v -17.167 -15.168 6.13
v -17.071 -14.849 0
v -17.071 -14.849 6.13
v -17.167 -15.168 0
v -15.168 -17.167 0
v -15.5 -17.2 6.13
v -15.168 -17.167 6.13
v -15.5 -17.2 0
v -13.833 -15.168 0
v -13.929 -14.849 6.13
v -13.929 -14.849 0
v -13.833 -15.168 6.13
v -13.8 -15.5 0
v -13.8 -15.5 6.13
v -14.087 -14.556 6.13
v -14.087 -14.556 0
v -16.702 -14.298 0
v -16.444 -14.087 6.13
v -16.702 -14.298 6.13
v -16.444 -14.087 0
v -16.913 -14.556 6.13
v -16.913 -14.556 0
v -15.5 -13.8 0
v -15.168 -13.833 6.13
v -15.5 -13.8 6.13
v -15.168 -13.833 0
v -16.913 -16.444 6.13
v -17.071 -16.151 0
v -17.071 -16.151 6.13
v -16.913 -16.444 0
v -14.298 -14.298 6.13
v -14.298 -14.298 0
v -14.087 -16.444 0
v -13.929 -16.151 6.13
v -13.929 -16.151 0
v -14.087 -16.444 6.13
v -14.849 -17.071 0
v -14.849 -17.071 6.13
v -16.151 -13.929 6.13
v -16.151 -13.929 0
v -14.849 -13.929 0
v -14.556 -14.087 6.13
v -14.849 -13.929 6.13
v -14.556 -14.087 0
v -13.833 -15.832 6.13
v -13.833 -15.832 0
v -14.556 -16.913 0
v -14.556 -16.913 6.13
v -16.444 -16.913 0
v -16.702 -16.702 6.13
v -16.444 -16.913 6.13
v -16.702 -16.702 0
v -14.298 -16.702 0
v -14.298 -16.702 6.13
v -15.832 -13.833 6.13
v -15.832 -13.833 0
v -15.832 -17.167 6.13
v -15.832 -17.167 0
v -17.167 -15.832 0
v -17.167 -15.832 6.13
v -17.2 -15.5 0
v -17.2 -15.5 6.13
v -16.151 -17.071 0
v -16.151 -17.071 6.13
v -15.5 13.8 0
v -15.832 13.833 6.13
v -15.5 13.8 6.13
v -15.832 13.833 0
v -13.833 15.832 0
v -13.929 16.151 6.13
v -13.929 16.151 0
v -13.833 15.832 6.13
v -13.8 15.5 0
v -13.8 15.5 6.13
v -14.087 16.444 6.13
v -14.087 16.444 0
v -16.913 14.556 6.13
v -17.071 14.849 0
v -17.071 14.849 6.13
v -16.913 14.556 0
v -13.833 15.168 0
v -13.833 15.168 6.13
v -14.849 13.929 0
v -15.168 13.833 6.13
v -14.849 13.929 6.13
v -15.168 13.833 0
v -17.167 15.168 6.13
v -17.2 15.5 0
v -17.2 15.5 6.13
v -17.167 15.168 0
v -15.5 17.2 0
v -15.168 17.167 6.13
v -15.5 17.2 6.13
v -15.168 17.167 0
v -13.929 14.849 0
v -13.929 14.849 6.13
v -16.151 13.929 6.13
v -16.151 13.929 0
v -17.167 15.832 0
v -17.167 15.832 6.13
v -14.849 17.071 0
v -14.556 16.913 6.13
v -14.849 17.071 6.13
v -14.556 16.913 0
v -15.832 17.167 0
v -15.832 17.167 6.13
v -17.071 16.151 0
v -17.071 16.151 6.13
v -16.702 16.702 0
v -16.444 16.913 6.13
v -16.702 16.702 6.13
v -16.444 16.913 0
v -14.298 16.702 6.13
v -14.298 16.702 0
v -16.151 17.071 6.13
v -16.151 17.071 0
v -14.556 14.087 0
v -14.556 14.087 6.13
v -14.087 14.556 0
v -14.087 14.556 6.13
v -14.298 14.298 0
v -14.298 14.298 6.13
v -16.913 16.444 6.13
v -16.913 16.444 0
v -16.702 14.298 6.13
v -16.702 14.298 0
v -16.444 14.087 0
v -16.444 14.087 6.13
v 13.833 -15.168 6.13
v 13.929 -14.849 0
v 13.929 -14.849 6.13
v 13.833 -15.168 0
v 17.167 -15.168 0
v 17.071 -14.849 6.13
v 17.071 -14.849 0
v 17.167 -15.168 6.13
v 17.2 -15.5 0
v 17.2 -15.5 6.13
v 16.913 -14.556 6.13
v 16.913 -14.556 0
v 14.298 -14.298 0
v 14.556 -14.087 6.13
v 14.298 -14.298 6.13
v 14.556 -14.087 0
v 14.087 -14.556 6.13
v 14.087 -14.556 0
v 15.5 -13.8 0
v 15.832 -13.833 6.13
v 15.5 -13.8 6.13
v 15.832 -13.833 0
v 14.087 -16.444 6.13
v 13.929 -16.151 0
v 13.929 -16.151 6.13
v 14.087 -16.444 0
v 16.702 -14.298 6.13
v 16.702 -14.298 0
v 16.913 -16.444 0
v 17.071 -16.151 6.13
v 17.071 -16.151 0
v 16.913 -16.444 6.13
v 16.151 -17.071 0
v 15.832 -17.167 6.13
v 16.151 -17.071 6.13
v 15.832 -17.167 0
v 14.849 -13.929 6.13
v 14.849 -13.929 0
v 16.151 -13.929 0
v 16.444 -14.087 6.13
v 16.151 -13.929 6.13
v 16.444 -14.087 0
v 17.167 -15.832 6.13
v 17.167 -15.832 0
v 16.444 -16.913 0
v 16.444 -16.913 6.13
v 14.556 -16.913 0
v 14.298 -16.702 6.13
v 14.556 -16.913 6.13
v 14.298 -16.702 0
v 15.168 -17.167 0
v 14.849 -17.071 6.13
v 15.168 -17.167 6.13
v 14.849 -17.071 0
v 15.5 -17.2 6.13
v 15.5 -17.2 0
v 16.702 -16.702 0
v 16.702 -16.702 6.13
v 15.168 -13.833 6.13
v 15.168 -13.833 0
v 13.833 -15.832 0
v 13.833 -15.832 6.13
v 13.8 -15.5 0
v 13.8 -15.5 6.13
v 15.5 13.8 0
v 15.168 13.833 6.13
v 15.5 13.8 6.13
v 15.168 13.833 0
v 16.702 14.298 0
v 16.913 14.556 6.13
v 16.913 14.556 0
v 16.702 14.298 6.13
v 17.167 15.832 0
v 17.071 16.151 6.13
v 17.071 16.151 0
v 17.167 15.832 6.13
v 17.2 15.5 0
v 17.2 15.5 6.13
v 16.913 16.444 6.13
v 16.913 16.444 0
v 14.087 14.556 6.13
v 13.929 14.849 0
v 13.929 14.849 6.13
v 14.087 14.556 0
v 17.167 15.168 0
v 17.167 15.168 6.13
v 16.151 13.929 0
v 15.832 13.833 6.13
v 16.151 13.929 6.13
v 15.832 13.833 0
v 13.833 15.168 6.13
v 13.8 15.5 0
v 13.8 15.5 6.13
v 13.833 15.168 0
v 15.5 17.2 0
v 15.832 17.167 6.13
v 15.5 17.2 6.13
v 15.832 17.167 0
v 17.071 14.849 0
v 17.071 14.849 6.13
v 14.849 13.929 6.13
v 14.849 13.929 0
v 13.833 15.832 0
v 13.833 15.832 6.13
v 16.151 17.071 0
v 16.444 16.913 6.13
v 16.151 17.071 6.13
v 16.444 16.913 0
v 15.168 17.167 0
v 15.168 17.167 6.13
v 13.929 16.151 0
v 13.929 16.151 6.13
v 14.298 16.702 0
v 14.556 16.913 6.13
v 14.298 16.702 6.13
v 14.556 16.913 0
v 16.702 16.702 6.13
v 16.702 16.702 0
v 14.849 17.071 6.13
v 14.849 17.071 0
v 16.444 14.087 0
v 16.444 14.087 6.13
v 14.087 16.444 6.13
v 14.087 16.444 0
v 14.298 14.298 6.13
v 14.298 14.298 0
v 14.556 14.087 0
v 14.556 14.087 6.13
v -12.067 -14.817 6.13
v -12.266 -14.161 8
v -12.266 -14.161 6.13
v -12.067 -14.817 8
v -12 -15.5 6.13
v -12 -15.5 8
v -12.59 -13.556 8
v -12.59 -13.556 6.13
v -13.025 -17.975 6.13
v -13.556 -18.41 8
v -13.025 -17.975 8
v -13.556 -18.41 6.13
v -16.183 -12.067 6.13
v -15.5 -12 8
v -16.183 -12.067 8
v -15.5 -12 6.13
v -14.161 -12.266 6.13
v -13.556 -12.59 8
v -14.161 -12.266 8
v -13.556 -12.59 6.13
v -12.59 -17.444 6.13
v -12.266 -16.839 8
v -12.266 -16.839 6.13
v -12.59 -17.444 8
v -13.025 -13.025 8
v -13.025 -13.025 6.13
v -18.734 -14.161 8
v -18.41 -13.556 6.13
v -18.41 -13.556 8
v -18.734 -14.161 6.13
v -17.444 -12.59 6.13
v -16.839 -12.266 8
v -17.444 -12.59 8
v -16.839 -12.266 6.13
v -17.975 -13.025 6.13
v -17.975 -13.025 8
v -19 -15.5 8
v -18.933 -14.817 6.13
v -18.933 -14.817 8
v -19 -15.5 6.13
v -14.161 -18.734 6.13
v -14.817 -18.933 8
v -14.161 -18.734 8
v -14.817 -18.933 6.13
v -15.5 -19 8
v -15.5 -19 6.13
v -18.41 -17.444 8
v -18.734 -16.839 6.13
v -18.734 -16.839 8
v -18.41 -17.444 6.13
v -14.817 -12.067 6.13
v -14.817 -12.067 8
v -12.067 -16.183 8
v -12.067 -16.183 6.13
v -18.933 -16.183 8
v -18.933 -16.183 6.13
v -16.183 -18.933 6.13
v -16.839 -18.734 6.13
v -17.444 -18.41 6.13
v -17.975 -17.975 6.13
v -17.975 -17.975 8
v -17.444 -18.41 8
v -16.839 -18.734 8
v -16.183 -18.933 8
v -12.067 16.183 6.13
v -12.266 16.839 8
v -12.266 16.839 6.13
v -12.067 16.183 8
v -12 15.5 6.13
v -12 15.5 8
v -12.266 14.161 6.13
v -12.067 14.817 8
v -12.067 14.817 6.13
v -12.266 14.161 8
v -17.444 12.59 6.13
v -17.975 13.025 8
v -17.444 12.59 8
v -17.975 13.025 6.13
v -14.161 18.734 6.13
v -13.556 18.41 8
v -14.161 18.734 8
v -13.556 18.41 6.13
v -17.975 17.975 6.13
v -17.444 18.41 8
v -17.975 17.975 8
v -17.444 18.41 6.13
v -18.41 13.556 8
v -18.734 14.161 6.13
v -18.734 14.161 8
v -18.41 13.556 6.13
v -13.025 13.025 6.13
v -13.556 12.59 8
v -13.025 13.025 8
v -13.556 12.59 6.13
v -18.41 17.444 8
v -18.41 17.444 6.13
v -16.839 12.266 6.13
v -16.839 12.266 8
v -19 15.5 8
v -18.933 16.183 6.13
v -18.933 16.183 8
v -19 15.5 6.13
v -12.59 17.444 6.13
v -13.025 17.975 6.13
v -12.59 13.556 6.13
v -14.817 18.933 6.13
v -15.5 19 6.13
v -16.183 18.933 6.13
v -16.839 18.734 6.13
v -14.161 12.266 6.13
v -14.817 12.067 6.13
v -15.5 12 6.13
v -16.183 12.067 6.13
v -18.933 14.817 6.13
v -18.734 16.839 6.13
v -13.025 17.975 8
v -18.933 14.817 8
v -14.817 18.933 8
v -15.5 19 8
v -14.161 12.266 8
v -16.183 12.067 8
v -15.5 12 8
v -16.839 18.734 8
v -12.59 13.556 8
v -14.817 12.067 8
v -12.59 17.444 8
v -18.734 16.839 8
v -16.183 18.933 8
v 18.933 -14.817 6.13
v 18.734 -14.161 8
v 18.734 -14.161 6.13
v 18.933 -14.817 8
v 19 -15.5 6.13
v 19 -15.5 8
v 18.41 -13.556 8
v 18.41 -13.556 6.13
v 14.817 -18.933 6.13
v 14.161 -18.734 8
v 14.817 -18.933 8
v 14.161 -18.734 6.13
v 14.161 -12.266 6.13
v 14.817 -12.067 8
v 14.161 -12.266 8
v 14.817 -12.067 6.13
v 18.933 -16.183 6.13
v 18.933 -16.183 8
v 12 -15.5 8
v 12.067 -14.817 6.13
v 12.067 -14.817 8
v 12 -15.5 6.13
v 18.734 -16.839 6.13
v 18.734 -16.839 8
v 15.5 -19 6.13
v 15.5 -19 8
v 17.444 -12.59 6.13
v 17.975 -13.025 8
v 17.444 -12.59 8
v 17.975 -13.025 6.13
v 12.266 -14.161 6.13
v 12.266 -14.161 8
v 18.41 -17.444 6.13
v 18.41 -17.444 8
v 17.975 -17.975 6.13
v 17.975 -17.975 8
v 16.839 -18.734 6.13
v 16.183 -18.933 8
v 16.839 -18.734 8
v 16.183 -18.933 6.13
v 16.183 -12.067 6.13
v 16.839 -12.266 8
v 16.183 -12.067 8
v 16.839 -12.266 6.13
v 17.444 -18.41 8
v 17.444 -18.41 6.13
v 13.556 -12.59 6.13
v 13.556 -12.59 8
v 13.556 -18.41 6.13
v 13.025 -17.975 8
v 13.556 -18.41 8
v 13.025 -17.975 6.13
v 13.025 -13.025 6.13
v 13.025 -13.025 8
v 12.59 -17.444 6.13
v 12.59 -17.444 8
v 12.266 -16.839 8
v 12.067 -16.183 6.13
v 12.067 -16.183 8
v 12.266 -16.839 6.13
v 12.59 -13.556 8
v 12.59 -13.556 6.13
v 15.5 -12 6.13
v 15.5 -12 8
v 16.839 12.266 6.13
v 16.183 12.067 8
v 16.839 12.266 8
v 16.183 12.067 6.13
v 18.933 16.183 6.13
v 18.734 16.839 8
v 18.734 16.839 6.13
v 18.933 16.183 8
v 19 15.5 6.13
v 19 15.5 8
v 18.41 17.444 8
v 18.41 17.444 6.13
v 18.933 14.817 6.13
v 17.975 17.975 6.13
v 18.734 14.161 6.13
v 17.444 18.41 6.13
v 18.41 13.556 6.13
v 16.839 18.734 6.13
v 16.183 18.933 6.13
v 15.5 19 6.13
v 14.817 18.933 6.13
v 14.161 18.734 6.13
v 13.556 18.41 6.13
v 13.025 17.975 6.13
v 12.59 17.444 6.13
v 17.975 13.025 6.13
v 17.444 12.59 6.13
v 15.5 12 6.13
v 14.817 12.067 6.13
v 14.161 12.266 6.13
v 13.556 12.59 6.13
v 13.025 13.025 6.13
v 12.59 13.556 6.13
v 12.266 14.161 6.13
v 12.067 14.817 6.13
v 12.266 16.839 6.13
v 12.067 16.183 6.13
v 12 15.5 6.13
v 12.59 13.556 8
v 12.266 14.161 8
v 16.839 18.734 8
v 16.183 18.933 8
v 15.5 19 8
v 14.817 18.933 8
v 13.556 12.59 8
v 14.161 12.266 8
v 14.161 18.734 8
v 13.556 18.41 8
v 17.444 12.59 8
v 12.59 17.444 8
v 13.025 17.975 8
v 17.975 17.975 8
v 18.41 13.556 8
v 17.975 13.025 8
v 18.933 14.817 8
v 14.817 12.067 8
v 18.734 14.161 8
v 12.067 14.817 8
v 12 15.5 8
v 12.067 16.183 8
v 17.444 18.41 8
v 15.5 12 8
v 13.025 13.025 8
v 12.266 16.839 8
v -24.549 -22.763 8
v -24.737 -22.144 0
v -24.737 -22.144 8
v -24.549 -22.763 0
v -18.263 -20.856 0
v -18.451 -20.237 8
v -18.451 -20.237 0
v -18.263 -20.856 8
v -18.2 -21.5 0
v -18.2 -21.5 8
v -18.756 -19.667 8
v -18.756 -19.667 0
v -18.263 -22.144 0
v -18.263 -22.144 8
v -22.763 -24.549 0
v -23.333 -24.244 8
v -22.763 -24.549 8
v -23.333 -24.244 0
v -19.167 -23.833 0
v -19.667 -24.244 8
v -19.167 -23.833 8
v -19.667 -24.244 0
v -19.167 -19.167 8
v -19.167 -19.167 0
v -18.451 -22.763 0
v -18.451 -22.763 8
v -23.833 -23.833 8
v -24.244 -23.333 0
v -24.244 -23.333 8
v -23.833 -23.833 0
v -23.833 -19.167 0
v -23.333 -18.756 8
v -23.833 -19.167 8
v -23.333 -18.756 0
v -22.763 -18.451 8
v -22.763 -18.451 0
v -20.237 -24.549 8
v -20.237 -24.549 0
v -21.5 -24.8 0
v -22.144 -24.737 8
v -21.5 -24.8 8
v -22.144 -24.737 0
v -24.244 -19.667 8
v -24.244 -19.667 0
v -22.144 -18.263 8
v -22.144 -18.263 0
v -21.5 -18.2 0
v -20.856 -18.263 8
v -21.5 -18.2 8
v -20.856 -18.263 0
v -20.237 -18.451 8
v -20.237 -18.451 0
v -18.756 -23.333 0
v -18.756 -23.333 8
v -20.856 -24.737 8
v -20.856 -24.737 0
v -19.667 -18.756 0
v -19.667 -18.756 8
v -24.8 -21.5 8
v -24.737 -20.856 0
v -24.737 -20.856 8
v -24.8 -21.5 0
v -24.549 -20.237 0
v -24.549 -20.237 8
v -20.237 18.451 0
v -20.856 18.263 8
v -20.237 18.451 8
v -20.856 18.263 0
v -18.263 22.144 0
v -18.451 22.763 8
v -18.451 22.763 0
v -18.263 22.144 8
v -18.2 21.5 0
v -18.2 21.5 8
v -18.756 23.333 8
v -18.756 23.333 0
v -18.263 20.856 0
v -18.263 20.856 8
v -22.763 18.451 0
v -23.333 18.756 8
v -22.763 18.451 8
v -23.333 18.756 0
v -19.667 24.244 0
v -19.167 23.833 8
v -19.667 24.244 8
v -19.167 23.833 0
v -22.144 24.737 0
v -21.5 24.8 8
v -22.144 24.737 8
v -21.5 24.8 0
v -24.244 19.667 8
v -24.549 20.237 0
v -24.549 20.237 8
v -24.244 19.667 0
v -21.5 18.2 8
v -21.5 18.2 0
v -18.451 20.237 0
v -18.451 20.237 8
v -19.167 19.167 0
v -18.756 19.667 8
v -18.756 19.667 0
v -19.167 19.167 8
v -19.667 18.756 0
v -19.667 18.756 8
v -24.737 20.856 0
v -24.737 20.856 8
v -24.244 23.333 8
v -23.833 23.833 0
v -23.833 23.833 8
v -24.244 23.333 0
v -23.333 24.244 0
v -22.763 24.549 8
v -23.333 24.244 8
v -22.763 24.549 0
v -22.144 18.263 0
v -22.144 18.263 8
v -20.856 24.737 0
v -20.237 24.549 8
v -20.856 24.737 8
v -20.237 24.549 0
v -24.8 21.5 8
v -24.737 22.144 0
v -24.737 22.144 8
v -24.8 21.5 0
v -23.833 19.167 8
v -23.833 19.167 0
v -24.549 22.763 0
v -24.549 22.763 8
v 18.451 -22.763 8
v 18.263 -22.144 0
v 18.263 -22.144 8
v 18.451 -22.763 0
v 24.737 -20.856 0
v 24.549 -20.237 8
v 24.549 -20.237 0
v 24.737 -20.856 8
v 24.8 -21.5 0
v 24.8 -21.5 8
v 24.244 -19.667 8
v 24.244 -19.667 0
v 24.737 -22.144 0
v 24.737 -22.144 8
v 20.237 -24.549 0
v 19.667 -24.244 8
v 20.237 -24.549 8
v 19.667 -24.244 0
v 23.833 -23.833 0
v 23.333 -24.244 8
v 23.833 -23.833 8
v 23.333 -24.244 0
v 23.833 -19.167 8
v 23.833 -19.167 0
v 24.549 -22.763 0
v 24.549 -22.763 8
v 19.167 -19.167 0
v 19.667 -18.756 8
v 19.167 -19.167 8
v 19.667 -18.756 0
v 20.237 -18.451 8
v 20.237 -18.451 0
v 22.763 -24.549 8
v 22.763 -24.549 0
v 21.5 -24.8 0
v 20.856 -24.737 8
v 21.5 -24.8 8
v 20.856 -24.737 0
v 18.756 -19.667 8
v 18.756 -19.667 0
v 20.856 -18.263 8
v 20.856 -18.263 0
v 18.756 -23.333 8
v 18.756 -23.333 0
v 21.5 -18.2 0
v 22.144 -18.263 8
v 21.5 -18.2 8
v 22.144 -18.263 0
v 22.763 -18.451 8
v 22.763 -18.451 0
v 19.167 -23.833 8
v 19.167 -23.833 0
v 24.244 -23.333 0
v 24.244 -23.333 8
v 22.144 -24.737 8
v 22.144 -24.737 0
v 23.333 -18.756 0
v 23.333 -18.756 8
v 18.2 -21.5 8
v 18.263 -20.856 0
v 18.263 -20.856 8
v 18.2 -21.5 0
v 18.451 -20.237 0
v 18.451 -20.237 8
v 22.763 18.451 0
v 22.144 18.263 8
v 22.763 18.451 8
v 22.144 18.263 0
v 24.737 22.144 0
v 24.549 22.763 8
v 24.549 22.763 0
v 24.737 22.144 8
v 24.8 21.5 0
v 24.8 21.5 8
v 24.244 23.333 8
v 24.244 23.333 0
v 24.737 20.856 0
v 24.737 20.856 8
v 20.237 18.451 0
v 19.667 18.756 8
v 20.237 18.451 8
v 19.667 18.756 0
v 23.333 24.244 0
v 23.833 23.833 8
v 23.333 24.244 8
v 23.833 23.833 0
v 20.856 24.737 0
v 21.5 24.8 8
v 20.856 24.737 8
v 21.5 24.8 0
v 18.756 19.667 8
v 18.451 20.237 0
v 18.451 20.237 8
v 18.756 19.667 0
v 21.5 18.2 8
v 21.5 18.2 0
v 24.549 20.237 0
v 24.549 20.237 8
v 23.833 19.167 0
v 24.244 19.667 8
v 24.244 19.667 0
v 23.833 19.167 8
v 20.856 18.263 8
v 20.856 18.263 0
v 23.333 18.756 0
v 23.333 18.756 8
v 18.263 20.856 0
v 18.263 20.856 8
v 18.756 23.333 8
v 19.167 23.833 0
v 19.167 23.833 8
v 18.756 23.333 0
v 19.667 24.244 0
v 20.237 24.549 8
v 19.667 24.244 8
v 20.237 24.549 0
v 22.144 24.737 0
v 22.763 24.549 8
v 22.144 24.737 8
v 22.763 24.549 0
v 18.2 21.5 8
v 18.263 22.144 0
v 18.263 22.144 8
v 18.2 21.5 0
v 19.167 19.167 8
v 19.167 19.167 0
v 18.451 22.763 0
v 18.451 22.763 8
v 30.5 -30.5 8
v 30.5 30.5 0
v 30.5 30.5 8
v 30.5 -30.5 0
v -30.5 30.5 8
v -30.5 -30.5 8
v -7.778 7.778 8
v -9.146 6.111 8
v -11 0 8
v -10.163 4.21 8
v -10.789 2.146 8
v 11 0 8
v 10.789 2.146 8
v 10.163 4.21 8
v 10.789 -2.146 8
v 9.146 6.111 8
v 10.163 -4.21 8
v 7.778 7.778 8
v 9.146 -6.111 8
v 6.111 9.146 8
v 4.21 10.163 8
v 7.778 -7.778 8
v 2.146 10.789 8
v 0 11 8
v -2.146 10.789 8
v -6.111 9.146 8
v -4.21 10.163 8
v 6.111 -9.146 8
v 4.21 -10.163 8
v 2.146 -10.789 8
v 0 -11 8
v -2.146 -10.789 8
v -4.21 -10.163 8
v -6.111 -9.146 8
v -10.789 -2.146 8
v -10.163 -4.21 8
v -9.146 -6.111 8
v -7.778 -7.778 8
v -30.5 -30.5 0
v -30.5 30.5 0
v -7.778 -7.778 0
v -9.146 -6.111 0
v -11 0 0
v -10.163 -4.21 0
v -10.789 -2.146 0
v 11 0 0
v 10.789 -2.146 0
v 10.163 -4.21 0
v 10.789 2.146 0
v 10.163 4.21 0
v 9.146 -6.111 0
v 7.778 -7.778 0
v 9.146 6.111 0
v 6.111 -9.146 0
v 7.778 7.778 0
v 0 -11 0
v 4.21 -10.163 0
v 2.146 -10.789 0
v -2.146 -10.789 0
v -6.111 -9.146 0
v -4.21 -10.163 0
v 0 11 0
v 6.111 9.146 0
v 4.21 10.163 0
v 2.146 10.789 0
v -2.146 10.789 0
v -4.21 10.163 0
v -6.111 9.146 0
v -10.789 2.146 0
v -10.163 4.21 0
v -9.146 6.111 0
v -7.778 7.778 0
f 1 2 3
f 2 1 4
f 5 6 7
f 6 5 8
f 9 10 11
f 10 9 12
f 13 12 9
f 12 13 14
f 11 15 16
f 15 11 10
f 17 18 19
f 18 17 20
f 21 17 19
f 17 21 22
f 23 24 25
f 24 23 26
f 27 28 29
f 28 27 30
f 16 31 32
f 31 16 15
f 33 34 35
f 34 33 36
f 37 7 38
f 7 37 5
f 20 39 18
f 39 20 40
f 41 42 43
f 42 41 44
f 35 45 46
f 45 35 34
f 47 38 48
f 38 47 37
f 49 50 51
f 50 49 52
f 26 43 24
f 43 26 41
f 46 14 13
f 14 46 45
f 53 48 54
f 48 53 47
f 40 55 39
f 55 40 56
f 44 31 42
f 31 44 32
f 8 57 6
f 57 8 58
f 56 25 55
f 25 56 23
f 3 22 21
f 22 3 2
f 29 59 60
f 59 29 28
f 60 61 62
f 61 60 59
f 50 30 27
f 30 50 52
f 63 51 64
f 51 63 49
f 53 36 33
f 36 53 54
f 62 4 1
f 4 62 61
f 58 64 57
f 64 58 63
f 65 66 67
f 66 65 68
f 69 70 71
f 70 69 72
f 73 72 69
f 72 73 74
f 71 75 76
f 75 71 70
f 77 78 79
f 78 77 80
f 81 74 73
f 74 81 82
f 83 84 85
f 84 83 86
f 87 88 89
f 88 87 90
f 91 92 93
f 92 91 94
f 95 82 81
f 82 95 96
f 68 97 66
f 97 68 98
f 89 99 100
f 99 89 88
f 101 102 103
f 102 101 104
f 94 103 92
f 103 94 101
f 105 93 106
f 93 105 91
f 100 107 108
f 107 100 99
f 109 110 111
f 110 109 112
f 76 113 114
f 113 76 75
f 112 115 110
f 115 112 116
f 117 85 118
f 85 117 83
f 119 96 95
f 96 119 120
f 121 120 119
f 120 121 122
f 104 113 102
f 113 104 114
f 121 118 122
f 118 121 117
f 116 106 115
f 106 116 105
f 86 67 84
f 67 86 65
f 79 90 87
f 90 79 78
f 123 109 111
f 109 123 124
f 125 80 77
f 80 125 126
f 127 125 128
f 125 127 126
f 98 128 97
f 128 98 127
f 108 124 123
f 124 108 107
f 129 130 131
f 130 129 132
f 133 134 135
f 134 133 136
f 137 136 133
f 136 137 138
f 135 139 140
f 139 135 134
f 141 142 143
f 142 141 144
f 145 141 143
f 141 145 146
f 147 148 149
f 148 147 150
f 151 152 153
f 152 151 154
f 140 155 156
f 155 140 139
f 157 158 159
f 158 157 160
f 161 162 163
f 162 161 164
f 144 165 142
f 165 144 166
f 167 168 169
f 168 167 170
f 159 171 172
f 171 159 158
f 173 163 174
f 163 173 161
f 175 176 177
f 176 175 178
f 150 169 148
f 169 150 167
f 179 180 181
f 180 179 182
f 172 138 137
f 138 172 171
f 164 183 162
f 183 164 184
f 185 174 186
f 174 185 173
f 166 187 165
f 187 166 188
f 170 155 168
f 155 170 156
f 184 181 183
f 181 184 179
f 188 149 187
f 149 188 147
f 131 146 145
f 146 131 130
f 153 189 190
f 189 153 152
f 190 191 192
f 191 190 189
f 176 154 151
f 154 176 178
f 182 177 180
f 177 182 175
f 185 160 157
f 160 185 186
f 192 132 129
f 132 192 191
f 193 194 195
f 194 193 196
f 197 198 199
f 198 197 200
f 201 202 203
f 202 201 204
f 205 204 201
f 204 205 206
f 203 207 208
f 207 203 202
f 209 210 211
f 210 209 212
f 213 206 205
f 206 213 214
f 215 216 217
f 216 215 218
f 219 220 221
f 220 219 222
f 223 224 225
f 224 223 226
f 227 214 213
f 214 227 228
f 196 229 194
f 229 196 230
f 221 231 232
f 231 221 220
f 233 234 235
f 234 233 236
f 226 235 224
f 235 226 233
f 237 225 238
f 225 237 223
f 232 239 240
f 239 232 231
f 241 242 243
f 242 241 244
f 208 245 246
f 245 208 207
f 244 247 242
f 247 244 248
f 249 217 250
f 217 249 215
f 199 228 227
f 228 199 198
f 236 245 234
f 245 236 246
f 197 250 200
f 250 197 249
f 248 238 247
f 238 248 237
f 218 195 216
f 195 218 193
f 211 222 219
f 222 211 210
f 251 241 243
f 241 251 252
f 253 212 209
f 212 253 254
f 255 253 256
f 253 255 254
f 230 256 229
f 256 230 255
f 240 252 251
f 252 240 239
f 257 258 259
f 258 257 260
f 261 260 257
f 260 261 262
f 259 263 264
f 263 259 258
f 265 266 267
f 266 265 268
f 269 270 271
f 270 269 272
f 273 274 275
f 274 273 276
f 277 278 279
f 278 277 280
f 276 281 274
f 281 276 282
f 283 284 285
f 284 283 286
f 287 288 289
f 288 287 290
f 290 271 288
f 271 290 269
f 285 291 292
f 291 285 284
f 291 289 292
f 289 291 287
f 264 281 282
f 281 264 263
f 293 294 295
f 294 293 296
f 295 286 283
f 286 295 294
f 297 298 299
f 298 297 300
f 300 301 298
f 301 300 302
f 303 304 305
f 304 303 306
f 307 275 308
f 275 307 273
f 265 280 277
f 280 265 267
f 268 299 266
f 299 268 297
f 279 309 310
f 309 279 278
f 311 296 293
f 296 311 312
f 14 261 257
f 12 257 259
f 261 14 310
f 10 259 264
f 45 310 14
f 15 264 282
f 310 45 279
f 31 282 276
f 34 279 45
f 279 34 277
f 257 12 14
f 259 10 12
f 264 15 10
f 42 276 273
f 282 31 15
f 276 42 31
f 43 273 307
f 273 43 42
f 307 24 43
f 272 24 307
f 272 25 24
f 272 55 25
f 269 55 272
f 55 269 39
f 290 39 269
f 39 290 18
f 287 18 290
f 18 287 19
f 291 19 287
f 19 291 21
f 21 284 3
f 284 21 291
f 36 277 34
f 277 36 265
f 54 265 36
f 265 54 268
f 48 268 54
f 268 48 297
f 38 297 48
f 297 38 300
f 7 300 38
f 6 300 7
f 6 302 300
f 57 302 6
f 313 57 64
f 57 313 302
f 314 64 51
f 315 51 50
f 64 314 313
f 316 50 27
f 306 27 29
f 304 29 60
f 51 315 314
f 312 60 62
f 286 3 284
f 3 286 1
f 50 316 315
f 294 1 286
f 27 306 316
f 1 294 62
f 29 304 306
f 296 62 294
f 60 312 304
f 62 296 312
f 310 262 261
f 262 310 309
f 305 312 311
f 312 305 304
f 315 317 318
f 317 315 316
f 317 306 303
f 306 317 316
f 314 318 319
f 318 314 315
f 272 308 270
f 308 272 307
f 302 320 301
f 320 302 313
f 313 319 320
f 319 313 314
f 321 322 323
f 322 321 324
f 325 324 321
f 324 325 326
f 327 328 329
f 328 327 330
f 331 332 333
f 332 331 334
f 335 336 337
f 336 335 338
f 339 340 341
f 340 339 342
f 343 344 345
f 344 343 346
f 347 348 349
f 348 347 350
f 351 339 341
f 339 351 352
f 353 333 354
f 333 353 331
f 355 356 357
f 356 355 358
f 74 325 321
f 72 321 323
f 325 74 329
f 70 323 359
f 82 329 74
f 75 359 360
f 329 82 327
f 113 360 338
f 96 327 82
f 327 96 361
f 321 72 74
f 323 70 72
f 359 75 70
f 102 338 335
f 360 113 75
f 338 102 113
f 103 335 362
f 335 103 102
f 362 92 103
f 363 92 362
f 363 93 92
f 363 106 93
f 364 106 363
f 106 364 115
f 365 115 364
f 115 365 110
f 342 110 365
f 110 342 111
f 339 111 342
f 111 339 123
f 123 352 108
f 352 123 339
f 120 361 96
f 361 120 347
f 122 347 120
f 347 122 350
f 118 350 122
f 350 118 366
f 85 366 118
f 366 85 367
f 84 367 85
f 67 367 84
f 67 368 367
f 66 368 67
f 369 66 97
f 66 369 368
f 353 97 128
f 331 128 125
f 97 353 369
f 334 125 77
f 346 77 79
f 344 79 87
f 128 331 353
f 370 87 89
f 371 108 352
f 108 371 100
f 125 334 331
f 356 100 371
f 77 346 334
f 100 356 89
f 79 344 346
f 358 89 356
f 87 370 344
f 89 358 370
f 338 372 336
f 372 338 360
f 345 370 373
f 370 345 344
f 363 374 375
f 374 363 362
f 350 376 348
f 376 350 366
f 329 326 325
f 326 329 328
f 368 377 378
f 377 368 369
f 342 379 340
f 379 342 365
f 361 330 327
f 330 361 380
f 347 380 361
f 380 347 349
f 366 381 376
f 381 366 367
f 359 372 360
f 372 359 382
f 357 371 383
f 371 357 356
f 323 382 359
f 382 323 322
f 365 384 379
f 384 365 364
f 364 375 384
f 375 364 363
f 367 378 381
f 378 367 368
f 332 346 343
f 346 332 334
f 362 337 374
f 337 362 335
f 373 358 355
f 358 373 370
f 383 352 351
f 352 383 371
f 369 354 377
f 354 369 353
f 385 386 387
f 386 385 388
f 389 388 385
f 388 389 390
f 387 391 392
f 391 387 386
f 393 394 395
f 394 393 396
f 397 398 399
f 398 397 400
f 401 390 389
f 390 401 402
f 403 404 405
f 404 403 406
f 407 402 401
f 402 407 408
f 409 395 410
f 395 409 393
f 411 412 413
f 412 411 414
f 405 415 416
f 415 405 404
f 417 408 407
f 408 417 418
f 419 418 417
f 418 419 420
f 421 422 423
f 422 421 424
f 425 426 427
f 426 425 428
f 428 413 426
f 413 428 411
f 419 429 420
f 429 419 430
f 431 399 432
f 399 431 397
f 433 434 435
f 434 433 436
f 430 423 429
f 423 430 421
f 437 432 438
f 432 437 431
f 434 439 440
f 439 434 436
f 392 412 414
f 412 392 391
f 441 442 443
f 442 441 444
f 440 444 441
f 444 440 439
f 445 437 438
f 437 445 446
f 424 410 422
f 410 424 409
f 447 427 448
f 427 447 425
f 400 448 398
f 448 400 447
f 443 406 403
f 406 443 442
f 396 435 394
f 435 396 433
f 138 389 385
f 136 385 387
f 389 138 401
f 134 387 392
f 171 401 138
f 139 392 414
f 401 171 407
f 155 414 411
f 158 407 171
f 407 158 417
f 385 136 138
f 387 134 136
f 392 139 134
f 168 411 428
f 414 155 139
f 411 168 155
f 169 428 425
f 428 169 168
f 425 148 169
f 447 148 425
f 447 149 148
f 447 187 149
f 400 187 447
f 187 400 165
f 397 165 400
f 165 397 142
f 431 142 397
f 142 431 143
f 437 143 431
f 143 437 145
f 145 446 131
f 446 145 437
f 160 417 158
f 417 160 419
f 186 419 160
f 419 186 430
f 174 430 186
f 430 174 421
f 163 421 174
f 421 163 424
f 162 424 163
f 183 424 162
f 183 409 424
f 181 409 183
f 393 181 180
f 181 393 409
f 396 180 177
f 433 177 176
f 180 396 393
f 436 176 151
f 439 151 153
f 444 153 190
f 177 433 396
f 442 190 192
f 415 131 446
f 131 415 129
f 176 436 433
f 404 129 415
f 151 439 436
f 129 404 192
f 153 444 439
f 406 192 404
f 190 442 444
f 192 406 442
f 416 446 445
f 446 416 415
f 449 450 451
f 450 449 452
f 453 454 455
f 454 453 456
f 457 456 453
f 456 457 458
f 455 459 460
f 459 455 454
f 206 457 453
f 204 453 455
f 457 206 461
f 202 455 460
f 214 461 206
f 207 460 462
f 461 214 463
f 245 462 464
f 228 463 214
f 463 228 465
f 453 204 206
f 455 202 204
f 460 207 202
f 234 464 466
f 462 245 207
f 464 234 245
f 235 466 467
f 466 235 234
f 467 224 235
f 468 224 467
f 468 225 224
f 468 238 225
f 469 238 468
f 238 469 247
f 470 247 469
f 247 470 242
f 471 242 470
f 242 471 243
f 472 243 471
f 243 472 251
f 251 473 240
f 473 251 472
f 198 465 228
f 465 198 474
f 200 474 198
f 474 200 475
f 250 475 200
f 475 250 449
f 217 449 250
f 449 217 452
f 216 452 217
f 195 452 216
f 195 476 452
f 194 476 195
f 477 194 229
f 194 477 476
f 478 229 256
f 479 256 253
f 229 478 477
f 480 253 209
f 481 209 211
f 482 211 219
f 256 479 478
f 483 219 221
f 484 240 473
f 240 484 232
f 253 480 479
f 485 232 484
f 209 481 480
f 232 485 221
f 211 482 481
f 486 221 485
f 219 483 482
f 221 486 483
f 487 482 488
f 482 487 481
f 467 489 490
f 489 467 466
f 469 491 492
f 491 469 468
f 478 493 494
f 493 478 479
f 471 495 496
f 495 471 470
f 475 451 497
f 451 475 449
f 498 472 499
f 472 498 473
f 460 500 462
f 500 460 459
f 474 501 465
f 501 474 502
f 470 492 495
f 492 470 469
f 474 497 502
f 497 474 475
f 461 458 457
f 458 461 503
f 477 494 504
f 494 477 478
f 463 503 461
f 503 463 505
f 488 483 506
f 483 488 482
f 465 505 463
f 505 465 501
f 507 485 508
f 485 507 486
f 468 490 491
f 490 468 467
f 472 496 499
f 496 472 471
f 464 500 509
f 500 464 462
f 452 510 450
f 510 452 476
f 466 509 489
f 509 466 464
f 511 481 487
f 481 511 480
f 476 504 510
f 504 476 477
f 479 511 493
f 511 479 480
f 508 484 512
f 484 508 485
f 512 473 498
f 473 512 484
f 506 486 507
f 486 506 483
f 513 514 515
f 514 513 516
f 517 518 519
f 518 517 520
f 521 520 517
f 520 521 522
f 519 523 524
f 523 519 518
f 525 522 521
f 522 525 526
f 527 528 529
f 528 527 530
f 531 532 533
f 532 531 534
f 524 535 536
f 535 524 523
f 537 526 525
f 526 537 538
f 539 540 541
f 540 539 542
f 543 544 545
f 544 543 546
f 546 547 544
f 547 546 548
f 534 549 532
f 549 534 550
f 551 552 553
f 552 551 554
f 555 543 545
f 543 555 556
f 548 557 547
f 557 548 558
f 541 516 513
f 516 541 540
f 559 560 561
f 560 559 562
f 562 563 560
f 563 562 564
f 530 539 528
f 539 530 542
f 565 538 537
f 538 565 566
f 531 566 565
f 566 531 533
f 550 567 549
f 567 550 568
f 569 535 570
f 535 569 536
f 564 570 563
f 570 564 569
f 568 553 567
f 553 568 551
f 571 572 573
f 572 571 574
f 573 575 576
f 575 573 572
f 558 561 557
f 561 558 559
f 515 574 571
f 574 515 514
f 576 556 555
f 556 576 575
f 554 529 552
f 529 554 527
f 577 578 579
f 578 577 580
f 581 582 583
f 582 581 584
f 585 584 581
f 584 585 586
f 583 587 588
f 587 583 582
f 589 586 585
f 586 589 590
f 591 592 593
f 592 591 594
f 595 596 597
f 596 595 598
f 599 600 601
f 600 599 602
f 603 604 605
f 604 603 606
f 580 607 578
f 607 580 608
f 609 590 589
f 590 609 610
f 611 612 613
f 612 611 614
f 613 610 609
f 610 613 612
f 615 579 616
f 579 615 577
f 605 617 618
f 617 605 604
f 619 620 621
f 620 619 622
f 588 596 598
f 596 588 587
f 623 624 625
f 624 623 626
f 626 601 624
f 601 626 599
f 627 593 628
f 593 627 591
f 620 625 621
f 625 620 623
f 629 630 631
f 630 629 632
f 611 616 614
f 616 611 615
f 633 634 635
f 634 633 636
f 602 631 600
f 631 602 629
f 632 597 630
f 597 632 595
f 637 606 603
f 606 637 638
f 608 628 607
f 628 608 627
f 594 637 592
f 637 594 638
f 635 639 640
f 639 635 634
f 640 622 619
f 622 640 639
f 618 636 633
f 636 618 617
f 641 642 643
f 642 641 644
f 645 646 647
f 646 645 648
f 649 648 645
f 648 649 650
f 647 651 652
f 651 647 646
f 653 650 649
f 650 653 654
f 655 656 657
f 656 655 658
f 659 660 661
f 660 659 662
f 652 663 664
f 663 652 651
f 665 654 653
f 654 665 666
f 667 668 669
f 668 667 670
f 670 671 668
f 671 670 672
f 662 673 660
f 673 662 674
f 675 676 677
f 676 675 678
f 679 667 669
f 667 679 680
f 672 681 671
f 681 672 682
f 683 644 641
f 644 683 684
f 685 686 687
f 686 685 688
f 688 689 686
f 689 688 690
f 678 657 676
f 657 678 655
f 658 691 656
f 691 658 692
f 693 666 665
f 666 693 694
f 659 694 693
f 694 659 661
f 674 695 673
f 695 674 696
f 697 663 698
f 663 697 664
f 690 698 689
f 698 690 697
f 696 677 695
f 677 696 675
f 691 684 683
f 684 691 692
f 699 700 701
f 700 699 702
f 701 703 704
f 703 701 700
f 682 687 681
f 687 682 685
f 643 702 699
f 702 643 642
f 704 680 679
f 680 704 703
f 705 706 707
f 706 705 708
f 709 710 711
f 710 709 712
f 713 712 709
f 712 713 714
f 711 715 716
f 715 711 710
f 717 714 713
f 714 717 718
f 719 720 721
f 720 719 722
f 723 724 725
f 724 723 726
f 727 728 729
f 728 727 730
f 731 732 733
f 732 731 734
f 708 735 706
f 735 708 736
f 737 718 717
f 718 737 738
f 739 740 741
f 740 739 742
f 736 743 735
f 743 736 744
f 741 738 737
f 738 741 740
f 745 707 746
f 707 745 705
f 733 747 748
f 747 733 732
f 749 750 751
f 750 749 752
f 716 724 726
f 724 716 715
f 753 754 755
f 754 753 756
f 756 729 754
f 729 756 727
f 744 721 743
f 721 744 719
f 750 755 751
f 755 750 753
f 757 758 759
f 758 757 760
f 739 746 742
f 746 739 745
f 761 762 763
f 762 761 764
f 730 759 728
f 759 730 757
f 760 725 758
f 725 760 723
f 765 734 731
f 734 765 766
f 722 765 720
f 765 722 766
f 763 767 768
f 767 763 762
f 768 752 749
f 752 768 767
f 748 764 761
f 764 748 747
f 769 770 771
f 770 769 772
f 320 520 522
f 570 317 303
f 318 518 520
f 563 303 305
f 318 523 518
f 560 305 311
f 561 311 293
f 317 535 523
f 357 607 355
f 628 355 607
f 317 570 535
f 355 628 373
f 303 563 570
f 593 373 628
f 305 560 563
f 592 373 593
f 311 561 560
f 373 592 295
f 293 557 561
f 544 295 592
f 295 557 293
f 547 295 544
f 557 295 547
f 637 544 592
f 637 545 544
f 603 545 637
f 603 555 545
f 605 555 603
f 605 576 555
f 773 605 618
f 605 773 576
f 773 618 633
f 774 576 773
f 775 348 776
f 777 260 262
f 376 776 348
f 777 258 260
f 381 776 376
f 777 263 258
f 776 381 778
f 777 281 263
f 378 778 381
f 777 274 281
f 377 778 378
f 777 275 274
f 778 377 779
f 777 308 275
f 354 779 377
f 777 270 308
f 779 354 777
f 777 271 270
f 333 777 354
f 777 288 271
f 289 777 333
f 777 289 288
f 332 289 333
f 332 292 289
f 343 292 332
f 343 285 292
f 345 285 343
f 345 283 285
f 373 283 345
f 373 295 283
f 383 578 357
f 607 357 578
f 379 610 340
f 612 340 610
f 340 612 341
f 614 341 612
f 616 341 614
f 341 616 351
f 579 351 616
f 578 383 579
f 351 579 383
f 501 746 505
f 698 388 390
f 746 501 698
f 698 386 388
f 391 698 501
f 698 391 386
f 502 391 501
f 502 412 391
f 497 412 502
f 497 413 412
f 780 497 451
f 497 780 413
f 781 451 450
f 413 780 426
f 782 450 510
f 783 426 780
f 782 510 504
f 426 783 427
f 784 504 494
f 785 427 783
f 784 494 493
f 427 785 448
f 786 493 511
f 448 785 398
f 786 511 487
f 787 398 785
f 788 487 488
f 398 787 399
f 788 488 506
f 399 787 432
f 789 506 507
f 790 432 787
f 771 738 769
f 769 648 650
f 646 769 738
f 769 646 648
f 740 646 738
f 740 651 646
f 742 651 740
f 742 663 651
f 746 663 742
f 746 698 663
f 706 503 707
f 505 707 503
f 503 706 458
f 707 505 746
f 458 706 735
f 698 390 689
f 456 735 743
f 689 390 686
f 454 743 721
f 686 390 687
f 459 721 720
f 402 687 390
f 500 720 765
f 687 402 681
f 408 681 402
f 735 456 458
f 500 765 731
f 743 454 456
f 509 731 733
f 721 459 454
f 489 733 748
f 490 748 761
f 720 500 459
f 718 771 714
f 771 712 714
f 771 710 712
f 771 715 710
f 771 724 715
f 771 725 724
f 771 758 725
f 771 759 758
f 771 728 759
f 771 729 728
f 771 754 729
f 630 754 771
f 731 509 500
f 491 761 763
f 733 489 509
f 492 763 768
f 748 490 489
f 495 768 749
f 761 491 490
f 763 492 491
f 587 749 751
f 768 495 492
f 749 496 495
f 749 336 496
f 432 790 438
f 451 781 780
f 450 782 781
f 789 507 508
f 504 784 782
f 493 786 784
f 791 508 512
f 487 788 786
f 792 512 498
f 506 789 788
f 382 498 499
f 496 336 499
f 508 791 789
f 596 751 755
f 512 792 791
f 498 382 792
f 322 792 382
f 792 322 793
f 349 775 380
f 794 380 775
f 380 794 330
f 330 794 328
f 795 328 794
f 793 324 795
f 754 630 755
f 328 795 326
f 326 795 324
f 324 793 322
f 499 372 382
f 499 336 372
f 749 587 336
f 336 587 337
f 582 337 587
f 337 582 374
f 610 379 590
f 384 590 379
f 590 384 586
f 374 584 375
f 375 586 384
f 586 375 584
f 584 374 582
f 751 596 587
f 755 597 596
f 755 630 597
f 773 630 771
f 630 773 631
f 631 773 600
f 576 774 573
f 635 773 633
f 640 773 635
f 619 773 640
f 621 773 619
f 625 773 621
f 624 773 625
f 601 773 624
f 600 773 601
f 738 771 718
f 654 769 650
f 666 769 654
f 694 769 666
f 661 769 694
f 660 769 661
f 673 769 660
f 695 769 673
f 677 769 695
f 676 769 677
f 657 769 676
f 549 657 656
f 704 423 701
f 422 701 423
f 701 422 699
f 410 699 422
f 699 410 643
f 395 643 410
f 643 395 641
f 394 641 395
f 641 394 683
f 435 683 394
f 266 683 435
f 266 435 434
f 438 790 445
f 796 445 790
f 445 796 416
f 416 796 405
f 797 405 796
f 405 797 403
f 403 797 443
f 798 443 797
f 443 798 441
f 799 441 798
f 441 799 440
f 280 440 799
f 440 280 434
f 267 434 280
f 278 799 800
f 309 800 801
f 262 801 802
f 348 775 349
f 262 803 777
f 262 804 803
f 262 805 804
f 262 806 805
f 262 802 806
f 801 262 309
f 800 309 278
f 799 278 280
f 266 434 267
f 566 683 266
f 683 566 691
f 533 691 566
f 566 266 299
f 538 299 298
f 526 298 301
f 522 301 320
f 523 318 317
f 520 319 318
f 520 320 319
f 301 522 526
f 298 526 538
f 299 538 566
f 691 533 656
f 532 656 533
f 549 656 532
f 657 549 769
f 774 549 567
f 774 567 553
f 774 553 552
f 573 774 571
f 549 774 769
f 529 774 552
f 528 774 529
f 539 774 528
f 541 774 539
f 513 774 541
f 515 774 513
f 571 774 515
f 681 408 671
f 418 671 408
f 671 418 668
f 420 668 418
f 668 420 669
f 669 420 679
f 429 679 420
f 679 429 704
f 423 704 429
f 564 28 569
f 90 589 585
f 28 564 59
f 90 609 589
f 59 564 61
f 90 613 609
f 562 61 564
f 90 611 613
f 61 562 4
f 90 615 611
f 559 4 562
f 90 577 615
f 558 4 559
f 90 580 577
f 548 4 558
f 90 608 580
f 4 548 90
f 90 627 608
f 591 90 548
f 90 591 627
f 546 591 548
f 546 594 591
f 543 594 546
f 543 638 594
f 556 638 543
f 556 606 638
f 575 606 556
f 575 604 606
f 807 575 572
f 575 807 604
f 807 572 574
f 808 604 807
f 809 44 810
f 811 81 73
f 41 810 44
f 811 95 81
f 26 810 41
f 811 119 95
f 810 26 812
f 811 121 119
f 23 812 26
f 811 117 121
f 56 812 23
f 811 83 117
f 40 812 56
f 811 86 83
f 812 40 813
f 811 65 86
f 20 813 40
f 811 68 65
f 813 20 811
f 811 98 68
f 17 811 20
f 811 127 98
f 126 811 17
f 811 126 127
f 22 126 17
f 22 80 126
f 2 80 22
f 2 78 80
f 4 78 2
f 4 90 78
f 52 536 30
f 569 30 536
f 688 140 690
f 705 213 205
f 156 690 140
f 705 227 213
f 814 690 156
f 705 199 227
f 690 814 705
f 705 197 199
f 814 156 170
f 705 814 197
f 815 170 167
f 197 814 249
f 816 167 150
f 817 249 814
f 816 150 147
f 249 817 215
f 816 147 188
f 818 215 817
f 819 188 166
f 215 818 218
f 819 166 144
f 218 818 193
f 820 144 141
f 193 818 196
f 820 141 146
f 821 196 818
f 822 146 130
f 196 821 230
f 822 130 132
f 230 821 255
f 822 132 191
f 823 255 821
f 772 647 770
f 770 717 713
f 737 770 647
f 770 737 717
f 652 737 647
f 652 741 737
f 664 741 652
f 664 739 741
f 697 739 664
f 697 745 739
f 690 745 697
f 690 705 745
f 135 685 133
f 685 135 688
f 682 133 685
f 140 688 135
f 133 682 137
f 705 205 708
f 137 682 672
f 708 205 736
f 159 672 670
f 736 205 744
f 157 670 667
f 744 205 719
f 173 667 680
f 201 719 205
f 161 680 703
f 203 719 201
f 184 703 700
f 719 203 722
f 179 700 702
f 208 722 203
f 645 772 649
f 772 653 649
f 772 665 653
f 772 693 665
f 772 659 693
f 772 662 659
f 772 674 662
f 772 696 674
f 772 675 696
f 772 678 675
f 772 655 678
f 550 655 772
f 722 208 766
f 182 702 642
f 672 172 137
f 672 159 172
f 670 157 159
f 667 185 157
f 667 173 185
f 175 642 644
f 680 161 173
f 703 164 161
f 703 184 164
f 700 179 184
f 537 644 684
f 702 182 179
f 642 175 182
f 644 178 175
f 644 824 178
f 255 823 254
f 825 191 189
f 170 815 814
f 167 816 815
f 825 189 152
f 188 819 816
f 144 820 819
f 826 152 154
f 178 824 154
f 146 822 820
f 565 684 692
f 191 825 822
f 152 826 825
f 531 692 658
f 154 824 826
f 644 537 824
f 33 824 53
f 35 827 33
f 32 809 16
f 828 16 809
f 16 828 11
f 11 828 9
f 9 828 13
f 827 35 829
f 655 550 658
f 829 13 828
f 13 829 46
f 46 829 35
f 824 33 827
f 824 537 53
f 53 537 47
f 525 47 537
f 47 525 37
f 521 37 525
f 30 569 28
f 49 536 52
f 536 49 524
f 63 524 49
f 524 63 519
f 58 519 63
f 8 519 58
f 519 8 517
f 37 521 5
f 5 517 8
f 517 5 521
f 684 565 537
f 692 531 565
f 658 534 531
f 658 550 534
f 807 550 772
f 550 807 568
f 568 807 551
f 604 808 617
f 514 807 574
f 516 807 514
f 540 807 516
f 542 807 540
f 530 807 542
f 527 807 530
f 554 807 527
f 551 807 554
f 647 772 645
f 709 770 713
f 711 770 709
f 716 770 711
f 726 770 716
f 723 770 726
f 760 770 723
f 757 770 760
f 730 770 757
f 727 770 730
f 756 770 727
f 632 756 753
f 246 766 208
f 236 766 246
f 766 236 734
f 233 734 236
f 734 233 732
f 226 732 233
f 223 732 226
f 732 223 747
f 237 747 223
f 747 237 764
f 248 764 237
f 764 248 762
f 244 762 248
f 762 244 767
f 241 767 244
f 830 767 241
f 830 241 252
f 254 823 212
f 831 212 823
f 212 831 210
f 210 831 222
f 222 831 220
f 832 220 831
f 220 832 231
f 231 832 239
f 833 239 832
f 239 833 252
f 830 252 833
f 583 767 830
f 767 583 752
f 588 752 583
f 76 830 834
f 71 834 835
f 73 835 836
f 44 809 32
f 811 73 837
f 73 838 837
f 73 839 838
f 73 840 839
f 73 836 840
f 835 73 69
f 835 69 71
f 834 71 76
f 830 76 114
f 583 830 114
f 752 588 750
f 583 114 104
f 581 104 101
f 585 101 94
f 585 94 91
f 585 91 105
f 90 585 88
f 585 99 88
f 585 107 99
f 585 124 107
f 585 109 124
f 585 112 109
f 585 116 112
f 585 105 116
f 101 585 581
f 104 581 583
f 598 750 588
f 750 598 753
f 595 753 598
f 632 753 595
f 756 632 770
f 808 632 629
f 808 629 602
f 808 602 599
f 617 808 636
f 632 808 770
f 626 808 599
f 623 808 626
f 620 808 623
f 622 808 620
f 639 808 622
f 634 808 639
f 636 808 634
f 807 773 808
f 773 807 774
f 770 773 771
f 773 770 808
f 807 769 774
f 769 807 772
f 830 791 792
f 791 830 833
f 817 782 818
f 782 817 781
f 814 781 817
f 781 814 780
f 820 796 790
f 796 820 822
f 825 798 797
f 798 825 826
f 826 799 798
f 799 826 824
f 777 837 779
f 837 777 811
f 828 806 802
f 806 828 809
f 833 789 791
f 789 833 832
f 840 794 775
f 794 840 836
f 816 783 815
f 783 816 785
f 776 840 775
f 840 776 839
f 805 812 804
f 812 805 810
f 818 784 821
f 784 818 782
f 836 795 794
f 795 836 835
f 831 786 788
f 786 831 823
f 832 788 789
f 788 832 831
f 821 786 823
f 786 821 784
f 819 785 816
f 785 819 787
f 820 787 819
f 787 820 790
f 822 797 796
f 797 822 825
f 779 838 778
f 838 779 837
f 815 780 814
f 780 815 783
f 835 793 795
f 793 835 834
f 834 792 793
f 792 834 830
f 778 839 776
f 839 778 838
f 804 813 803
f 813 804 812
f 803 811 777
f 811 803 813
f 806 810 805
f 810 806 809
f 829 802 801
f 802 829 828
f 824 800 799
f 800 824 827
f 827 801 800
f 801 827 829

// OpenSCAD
$fn = 32;

// ----------------------------------------------------------------------
// Motor mount plate: NEMA17, 61 x 61 x 8 mm
// ----------------------------------------------------------------------

// --- parameters (mm) ---
plate_w = 61;             // plate length, X
plate_d = 61;             // plate width, Y
plate_t = 8;              // plate thickness
pattern = 31;             // NEMA17 bolt spacing
motor_d = 3.4;            // NEMA17 screw clearance
pilot_d = 22;             // pilot boss bore
cb_d = 7;                 // counterbore seat
cb_h = 1.87;              // counterbore depth
second_d = 6.6;           // second fastener hole

module plate() {
  translate([-plate_w / 2, -plate_d / 2, 0]) cube([plate_w, plate_d, plate_t]);
}

module motor_holes() {
  for (sx = [-1, 1]) for (sy = [-1, 1])
    translate([sx * pattern / 2, sy * pattern / 2, -1])
      cylinder(h = plate_t + 2, d = motor_d);
}
module motor_counterbores() {
  for (sx = [-1, 1]) for (sy = [-1, 1])
    translate([sx * pattern / 2, sy * pattern / 2, plate_t - cb_h])
      cylinder(h = cb_h + 0.6, d = cb_d);
}

difference() {
  union() {
    plate();
  }
  motor_holes();
  translate([0, 0, -1]) cylinder(h = plate_t + 2, d = pilot_d);
  motor_counterbores();
  for (sx = [-1, 1]) for (sy = [-1, 1])
    translate([sx * 21.5, sy * 21.5, -1]) cylinder(h = plate_t + 2, d = second_d);
}
